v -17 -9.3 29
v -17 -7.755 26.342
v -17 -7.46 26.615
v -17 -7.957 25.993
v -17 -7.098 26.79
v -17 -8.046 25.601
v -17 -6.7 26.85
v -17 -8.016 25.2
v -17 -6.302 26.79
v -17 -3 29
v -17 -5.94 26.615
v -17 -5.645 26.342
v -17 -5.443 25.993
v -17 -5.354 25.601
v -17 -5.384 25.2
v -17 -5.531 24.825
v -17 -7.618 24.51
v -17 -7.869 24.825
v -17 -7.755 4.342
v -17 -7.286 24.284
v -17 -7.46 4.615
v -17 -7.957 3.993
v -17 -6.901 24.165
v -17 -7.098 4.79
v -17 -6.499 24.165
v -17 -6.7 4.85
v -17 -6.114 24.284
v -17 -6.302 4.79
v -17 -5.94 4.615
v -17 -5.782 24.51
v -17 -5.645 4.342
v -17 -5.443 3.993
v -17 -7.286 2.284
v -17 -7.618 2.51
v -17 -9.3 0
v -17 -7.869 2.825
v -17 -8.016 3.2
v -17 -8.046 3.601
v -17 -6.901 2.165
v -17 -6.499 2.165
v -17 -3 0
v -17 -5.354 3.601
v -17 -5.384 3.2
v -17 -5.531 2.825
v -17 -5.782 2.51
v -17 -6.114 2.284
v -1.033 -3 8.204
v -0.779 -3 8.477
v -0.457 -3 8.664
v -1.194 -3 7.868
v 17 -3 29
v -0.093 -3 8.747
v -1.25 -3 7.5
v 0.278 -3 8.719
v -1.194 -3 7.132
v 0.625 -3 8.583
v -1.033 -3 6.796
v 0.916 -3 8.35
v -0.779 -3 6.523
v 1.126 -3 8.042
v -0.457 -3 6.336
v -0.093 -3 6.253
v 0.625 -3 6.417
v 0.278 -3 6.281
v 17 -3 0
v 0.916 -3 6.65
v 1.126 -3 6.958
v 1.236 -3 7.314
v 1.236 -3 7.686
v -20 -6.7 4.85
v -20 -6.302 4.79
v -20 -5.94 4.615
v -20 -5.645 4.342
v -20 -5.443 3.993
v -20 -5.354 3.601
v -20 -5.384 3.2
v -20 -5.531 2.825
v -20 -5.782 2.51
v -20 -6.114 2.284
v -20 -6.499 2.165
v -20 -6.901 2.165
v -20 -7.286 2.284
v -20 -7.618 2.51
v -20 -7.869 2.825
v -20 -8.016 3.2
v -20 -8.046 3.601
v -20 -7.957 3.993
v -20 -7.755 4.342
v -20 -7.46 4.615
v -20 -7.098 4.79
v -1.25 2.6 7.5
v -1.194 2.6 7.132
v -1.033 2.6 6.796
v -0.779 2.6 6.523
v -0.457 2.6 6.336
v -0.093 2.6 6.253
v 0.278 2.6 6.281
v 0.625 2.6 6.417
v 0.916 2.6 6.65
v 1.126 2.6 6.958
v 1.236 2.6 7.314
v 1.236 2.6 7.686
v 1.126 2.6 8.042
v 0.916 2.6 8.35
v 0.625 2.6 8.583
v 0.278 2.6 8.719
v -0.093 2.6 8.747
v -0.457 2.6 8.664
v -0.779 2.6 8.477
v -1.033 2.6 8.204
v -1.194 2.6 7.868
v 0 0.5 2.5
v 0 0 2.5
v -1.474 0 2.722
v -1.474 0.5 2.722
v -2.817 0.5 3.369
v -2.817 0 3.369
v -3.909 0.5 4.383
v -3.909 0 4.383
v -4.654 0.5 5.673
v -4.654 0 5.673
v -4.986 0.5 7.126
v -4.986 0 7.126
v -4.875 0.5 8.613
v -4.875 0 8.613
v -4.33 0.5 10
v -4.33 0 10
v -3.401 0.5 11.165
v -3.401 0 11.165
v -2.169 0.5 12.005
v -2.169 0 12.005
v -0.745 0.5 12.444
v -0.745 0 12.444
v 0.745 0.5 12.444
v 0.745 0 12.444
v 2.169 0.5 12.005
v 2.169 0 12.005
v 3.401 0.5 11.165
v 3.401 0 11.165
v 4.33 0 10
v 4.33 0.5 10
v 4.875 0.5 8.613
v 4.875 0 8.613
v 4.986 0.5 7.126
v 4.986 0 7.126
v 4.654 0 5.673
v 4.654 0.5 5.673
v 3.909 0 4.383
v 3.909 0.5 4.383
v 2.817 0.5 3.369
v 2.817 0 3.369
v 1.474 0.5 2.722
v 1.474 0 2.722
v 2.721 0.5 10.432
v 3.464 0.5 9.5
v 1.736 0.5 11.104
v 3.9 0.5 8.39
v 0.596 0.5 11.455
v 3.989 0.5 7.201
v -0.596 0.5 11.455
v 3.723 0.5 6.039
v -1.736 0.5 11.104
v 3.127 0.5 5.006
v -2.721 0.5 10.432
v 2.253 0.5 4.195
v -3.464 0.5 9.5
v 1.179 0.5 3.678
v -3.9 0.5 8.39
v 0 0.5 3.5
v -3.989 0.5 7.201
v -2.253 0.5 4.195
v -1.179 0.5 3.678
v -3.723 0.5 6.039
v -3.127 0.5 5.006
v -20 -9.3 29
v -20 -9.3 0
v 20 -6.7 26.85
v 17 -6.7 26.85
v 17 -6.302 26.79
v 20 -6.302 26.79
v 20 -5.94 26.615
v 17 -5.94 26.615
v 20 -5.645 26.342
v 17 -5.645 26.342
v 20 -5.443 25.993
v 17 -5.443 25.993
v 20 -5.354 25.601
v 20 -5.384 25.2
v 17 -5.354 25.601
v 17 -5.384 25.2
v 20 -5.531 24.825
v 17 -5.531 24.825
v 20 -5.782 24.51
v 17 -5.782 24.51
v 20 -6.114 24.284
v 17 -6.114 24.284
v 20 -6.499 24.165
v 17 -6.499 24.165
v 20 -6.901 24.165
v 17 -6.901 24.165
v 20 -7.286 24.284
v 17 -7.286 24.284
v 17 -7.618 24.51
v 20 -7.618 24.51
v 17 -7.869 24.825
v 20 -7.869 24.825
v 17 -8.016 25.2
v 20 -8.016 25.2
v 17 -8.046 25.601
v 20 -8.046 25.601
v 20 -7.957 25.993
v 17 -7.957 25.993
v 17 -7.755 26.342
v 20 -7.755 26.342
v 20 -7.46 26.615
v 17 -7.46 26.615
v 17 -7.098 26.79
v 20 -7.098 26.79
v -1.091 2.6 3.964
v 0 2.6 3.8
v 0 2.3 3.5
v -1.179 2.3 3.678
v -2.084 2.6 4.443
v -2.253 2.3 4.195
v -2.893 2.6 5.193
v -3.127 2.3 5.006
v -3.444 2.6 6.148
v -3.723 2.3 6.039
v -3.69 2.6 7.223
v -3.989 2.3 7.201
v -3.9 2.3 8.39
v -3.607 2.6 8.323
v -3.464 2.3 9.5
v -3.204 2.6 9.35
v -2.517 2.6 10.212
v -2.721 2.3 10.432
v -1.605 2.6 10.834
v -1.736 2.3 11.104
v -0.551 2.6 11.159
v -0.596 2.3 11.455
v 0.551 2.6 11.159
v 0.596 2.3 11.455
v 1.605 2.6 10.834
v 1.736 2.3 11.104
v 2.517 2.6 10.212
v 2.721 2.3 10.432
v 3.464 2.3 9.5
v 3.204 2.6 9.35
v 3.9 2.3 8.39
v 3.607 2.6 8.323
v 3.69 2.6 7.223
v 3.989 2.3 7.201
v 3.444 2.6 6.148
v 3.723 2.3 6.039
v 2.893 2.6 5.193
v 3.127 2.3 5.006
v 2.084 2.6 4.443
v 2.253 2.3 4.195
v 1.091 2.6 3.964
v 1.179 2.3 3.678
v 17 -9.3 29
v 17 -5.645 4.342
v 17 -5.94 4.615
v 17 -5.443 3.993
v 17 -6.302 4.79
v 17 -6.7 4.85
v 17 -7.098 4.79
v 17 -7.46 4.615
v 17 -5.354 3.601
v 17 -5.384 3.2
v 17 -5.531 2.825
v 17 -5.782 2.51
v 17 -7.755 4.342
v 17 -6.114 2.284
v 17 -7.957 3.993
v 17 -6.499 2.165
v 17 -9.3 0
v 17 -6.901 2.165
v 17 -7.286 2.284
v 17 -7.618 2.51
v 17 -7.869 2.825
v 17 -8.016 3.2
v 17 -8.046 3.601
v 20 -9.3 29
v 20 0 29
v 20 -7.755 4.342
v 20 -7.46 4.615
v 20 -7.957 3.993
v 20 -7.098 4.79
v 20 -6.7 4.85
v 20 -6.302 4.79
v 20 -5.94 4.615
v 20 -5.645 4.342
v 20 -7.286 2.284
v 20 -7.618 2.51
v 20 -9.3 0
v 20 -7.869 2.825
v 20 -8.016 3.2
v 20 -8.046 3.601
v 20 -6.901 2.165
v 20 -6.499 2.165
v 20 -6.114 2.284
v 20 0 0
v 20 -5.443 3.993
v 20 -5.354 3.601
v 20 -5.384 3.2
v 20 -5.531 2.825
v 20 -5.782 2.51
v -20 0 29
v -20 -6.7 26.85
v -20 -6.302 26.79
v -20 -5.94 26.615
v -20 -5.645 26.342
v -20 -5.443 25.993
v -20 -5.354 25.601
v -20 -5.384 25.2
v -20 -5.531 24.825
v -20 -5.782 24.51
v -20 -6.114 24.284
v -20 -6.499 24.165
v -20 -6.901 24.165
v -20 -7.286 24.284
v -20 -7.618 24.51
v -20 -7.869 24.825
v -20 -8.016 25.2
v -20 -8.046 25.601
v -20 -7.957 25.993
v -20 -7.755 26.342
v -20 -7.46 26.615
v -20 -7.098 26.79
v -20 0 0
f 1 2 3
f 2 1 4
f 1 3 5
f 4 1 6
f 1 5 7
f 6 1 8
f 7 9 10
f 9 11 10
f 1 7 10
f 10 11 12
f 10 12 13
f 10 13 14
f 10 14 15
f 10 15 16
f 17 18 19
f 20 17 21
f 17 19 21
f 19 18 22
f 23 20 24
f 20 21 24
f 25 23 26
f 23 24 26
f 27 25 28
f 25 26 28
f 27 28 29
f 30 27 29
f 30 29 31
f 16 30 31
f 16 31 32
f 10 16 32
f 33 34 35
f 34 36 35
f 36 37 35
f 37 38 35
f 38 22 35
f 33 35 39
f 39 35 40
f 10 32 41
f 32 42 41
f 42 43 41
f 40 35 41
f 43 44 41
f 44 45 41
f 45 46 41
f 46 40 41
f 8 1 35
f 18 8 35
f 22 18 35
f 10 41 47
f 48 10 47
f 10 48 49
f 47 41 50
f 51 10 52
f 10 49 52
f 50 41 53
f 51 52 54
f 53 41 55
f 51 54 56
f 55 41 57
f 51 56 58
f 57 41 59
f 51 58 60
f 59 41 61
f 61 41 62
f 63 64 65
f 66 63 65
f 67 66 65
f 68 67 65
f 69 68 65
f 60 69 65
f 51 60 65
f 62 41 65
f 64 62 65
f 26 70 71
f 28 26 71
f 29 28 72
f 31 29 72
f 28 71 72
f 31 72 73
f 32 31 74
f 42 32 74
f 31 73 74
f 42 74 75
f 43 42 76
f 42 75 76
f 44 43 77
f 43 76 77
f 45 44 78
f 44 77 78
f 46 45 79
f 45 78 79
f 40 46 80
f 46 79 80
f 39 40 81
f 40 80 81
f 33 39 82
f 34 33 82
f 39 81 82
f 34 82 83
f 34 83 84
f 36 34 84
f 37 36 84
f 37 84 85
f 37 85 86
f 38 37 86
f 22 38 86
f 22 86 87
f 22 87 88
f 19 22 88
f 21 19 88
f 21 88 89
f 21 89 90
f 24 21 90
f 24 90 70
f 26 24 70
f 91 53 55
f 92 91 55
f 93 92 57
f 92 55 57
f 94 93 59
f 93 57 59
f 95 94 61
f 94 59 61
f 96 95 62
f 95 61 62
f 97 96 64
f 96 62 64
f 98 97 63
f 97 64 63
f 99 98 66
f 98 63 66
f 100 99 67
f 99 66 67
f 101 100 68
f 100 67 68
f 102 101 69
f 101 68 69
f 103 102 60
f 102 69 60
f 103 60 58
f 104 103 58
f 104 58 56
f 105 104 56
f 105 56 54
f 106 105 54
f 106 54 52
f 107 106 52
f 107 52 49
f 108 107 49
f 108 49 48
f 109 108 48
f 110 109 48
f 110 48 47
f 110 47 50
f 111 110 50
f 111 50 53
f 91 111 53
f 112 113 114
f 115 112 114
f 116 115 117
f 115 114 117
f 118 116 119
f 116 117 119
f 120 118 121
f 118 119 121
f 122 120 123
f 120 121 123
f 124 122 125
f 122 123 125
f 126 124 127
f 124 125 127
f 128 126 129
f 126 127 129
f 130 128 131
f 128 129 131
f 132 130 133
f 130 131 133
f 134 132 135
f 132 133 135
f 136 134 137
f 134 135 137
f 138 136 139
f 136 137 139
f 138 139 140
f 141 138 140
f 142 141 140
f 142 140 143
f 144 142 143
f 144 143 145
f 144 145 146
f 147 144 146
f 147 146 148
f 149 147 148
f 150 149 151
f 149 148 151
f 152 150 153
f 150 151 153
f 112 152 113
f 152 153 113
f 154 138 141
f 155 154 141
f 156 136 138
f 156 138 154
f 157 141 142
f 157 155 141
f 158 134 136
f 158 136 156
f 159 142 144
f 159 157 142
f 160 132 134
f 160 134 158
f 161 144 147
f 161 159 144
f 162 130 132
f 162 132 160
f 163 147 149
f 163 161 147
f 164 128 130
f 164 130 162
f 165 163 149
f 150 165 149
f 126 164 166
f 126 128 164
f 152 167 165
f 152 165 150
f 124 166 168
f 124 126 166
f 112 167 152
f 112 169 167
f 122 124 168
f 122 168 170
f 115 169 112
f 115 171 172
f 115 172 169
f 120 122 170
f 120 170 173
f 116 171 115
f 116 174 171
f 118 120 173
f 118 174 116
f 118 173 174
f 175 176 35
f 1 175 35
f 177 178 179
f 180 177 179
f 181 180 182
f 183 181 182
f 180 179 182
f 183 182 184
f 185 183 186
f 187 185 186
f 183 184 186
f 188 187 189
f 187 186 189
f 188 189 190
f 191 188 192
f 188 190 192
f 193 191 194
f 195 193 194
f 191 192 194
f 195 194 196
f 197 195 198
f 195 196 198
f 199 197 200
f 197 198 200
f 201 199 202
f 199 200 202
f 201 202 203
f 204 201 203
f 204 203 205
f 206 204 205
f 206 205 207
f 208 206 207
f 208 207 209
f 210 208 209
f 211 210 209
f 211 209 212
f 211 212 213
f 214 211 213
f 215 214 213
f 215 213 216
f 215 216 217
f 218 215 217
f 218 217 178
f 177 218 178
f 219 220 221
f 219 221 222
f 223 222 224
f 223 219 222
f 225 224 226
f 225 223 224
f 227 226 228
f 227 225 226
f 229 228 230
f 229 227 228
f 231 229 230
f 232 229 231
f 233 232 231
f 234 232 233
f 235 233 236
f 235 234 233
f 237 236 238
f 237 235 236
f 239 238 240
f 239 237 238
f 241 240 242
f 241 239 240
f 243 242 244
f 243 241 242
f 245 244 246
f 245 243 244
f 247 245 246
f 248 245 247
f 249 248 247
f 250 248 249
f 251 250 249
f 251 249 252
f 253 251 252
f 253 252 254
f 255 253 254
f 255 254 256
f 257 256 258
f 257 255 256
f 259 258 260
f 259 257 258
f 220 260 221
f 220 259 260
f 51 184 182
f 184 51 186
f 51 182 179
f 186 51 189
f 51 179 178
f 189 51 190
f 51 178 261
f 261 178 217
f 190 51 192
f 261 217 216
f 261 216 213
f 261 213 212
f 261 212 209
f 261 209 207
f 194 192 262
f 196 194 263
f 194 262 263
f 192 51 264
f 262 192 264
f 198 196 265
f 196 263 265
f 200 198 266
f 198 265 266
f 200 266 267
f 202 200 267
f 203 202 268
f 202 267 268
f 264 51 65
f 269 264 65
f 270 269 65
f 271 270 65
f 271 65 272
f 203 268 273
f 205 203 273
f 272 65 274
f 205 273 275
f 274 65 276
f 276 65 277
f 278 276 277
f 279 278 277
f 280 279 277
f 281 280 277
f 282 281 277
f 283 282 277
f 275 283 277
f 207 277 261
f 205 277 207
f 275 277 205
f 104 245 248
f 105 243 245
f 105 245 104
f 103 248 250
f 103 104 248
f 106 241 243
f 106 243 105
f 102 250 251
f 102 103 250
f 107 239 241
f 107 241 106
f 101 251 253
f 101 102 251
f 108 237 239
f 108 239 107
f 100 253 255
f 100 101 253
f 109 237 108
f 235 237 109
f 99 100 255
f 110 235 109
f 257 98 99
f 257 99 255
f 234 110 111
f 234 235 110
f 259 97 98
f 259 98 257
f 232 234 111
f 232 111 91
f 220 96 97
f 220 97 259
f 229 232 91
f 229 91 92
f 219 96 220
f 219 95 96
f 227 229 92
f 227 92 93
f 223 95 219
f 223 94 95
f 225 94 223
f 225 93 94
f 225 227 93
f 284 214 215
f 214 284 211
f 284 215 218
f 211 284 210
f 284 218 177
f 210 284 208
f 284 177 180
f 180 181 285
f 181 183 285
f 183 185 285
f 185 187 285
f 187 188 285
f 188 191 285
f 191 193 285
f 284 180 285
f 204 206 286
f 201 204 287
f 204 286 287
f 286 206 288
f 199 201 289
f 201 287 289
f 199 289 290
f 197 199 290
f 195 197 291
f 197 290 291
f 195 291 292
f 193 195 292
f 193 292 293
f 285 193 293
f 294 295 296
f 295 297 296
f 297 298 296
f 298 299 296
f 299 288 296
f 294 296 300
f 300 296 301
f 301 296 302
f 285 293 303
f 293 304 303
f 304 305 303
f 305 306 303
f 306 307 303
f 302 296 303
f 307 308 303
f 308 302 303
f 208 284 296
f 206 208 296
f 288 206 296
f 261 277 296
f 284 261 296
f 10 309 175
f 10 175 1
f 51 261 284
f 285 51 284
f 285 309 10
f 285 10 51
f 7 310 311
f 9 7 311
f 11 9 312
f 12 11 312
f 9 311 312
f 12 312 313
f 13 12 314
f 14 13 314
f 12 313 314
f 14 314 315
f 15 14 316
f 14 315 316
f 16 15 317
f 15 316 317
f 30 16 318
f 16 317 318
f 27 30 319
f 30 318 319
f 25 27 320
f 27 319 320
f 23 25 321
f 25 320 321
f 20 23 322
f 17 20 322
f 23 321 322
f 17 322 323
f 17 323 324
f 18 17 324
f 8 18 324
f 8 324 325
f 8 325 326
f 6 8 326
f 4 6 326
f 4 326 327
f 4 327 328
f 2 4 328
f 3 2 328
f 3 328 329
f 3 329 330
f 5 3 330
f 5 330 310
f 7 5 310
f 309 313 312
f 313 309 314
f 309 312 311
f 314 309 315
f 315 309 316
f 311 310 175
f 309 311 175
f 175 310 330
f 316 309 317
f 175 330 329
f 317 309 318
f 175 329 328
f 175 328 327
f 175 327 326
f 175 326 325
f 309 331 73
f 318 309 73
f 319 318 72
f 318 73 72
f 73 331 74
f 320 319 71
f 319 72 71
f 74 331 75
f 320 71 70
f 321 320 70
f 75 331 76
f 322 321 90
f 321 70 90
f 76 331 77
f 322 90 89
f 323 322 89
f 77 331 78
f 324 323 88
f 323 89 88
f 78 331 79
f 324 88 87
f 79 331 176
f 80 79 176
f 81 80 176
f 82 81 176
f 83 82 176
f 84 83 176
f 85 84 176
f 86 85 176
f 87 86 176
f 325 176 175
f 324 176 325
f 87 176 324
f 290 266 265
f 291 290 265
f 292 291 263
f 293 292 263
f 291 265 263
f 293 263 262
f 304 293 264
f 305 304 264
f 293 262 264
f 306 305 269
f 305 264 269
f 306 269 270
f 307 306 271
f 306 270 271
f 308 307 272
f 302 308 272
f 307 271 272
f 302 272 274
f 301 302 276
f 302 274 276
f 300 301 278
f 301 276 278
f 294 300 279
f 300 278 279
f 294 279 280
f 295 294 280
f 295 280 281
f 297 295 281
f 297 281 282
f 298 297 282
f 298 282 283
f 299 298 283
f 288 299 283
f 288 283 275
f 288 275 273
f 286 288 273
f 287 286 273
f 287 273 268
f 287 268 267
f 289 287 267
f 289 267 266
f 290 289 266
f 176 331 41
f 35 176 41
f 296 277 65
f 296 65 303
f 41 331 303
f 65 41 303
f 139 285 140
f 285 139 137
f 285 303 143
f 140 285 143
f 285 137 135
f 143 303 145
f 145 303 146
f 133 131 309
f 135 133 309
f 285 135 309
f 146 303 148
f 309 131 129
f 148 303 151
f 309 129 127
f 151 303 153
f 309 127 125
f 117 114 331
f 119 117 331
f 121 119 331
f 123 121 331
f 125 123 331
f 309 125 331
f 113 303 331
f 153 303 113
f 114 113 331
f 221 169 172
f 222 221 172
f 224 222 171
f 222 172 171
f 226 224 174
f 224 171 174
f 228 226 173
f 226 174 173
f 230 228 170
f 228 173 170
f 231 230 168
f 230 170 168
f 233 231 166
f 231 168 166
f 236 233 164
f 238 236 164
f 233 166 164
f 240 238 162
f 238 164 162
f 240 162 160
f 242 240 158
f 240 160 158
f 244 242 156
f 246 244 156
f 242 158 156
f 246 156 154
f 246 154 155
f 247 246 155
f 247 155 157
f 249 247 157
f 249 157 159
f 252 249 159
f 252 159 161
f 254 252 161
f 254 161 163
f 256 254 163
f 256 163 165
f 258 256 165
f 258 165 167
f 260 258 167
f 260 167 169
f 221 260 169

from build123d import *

# Parameters (mm, degrees)
EXTRUDE_1_DEPTH         = 29
HOLE_WIZARD_2_7_2_7_1_D = 2.7
SKETCH_4_R              = 4
EXTRUDE_2_DEPTH         = 2.6
SKETCH_5_R              = 5
EXTRUDE_3_DEPTH         = 0.5
HOLE_WIZARD_M3_1_D      = 2.5
CHAMFER_2_SIZE          = 0.3


with BuildPart() as part:
    # 草图1 → 凸台-拉伸1 (new body)
    with BuildSketch(Plane.XY):
        Polygon((20, 0), (-20, 0), (-20, -9.3), (-17, -9.3), (-17, -3), (17, -3), (17, -9.3), (20, -9.3), align=None)
    extrude(amount=EXTRUDE_1_DEPTH)

    # Ø2.7 (2.7) 直径孔1 (through all)
    with Locations(Plane(origin=(20, 0, 0), x_dir=(0, 0, -1), z_dir=(1, 0, 0))):
        with Locations((-25.5, -6.7), (-3.5, -6.7)):
            Hole(HOLE_WIZARD_2_7_2_7_1_D / 2)

    # 草图4 → 凸台-拉伸2 (add)
    with BuildSketch(Plane(origin=(0, 0, 0), x_dir=(1, 0, 0), z_dir=(0, 1, 0))):
        with Locations(Location((0, -7.5, 0), (0, 0, 90))):
            Circle(SKETCH_4_R)
    extrude(amount=EXTRUDE_2_DEPTH)

    # 草图5 → 凸台-拉伸3 (add)
    with BuildSketch(Plane(origin=(0, 0, 0), x_dir=(1, 0, 0), z_dir=(0, 1, 0))):
        with Locations(Location((0, -7.5, 0), (0, 0, 90))):
            Circle(SKETCH_5_R)
    extrude(amount=EXTRUDE_3_DEPTH)

    # M3 螺纹孔的螺纹孔钻头1 (through all)
    with Locations(Plane(origin=(0, 2.6, 0), x_dir=(1, 0, 0), z_dir=(0, 1, 0))):
        with Locations((0, -7.5)):
            Hole(HOLE_WIZARD_M3_1_D / 2)

    # 倒角2
    chamfer_2_edges = [part.edges().sort_by_distance(p)[0] for p in [
        (0, 2.6, 11.5),
    ]]
    chamfer(chamfer_2_edges, length=CHAMFER_2_SIZE)


solid = part.part
